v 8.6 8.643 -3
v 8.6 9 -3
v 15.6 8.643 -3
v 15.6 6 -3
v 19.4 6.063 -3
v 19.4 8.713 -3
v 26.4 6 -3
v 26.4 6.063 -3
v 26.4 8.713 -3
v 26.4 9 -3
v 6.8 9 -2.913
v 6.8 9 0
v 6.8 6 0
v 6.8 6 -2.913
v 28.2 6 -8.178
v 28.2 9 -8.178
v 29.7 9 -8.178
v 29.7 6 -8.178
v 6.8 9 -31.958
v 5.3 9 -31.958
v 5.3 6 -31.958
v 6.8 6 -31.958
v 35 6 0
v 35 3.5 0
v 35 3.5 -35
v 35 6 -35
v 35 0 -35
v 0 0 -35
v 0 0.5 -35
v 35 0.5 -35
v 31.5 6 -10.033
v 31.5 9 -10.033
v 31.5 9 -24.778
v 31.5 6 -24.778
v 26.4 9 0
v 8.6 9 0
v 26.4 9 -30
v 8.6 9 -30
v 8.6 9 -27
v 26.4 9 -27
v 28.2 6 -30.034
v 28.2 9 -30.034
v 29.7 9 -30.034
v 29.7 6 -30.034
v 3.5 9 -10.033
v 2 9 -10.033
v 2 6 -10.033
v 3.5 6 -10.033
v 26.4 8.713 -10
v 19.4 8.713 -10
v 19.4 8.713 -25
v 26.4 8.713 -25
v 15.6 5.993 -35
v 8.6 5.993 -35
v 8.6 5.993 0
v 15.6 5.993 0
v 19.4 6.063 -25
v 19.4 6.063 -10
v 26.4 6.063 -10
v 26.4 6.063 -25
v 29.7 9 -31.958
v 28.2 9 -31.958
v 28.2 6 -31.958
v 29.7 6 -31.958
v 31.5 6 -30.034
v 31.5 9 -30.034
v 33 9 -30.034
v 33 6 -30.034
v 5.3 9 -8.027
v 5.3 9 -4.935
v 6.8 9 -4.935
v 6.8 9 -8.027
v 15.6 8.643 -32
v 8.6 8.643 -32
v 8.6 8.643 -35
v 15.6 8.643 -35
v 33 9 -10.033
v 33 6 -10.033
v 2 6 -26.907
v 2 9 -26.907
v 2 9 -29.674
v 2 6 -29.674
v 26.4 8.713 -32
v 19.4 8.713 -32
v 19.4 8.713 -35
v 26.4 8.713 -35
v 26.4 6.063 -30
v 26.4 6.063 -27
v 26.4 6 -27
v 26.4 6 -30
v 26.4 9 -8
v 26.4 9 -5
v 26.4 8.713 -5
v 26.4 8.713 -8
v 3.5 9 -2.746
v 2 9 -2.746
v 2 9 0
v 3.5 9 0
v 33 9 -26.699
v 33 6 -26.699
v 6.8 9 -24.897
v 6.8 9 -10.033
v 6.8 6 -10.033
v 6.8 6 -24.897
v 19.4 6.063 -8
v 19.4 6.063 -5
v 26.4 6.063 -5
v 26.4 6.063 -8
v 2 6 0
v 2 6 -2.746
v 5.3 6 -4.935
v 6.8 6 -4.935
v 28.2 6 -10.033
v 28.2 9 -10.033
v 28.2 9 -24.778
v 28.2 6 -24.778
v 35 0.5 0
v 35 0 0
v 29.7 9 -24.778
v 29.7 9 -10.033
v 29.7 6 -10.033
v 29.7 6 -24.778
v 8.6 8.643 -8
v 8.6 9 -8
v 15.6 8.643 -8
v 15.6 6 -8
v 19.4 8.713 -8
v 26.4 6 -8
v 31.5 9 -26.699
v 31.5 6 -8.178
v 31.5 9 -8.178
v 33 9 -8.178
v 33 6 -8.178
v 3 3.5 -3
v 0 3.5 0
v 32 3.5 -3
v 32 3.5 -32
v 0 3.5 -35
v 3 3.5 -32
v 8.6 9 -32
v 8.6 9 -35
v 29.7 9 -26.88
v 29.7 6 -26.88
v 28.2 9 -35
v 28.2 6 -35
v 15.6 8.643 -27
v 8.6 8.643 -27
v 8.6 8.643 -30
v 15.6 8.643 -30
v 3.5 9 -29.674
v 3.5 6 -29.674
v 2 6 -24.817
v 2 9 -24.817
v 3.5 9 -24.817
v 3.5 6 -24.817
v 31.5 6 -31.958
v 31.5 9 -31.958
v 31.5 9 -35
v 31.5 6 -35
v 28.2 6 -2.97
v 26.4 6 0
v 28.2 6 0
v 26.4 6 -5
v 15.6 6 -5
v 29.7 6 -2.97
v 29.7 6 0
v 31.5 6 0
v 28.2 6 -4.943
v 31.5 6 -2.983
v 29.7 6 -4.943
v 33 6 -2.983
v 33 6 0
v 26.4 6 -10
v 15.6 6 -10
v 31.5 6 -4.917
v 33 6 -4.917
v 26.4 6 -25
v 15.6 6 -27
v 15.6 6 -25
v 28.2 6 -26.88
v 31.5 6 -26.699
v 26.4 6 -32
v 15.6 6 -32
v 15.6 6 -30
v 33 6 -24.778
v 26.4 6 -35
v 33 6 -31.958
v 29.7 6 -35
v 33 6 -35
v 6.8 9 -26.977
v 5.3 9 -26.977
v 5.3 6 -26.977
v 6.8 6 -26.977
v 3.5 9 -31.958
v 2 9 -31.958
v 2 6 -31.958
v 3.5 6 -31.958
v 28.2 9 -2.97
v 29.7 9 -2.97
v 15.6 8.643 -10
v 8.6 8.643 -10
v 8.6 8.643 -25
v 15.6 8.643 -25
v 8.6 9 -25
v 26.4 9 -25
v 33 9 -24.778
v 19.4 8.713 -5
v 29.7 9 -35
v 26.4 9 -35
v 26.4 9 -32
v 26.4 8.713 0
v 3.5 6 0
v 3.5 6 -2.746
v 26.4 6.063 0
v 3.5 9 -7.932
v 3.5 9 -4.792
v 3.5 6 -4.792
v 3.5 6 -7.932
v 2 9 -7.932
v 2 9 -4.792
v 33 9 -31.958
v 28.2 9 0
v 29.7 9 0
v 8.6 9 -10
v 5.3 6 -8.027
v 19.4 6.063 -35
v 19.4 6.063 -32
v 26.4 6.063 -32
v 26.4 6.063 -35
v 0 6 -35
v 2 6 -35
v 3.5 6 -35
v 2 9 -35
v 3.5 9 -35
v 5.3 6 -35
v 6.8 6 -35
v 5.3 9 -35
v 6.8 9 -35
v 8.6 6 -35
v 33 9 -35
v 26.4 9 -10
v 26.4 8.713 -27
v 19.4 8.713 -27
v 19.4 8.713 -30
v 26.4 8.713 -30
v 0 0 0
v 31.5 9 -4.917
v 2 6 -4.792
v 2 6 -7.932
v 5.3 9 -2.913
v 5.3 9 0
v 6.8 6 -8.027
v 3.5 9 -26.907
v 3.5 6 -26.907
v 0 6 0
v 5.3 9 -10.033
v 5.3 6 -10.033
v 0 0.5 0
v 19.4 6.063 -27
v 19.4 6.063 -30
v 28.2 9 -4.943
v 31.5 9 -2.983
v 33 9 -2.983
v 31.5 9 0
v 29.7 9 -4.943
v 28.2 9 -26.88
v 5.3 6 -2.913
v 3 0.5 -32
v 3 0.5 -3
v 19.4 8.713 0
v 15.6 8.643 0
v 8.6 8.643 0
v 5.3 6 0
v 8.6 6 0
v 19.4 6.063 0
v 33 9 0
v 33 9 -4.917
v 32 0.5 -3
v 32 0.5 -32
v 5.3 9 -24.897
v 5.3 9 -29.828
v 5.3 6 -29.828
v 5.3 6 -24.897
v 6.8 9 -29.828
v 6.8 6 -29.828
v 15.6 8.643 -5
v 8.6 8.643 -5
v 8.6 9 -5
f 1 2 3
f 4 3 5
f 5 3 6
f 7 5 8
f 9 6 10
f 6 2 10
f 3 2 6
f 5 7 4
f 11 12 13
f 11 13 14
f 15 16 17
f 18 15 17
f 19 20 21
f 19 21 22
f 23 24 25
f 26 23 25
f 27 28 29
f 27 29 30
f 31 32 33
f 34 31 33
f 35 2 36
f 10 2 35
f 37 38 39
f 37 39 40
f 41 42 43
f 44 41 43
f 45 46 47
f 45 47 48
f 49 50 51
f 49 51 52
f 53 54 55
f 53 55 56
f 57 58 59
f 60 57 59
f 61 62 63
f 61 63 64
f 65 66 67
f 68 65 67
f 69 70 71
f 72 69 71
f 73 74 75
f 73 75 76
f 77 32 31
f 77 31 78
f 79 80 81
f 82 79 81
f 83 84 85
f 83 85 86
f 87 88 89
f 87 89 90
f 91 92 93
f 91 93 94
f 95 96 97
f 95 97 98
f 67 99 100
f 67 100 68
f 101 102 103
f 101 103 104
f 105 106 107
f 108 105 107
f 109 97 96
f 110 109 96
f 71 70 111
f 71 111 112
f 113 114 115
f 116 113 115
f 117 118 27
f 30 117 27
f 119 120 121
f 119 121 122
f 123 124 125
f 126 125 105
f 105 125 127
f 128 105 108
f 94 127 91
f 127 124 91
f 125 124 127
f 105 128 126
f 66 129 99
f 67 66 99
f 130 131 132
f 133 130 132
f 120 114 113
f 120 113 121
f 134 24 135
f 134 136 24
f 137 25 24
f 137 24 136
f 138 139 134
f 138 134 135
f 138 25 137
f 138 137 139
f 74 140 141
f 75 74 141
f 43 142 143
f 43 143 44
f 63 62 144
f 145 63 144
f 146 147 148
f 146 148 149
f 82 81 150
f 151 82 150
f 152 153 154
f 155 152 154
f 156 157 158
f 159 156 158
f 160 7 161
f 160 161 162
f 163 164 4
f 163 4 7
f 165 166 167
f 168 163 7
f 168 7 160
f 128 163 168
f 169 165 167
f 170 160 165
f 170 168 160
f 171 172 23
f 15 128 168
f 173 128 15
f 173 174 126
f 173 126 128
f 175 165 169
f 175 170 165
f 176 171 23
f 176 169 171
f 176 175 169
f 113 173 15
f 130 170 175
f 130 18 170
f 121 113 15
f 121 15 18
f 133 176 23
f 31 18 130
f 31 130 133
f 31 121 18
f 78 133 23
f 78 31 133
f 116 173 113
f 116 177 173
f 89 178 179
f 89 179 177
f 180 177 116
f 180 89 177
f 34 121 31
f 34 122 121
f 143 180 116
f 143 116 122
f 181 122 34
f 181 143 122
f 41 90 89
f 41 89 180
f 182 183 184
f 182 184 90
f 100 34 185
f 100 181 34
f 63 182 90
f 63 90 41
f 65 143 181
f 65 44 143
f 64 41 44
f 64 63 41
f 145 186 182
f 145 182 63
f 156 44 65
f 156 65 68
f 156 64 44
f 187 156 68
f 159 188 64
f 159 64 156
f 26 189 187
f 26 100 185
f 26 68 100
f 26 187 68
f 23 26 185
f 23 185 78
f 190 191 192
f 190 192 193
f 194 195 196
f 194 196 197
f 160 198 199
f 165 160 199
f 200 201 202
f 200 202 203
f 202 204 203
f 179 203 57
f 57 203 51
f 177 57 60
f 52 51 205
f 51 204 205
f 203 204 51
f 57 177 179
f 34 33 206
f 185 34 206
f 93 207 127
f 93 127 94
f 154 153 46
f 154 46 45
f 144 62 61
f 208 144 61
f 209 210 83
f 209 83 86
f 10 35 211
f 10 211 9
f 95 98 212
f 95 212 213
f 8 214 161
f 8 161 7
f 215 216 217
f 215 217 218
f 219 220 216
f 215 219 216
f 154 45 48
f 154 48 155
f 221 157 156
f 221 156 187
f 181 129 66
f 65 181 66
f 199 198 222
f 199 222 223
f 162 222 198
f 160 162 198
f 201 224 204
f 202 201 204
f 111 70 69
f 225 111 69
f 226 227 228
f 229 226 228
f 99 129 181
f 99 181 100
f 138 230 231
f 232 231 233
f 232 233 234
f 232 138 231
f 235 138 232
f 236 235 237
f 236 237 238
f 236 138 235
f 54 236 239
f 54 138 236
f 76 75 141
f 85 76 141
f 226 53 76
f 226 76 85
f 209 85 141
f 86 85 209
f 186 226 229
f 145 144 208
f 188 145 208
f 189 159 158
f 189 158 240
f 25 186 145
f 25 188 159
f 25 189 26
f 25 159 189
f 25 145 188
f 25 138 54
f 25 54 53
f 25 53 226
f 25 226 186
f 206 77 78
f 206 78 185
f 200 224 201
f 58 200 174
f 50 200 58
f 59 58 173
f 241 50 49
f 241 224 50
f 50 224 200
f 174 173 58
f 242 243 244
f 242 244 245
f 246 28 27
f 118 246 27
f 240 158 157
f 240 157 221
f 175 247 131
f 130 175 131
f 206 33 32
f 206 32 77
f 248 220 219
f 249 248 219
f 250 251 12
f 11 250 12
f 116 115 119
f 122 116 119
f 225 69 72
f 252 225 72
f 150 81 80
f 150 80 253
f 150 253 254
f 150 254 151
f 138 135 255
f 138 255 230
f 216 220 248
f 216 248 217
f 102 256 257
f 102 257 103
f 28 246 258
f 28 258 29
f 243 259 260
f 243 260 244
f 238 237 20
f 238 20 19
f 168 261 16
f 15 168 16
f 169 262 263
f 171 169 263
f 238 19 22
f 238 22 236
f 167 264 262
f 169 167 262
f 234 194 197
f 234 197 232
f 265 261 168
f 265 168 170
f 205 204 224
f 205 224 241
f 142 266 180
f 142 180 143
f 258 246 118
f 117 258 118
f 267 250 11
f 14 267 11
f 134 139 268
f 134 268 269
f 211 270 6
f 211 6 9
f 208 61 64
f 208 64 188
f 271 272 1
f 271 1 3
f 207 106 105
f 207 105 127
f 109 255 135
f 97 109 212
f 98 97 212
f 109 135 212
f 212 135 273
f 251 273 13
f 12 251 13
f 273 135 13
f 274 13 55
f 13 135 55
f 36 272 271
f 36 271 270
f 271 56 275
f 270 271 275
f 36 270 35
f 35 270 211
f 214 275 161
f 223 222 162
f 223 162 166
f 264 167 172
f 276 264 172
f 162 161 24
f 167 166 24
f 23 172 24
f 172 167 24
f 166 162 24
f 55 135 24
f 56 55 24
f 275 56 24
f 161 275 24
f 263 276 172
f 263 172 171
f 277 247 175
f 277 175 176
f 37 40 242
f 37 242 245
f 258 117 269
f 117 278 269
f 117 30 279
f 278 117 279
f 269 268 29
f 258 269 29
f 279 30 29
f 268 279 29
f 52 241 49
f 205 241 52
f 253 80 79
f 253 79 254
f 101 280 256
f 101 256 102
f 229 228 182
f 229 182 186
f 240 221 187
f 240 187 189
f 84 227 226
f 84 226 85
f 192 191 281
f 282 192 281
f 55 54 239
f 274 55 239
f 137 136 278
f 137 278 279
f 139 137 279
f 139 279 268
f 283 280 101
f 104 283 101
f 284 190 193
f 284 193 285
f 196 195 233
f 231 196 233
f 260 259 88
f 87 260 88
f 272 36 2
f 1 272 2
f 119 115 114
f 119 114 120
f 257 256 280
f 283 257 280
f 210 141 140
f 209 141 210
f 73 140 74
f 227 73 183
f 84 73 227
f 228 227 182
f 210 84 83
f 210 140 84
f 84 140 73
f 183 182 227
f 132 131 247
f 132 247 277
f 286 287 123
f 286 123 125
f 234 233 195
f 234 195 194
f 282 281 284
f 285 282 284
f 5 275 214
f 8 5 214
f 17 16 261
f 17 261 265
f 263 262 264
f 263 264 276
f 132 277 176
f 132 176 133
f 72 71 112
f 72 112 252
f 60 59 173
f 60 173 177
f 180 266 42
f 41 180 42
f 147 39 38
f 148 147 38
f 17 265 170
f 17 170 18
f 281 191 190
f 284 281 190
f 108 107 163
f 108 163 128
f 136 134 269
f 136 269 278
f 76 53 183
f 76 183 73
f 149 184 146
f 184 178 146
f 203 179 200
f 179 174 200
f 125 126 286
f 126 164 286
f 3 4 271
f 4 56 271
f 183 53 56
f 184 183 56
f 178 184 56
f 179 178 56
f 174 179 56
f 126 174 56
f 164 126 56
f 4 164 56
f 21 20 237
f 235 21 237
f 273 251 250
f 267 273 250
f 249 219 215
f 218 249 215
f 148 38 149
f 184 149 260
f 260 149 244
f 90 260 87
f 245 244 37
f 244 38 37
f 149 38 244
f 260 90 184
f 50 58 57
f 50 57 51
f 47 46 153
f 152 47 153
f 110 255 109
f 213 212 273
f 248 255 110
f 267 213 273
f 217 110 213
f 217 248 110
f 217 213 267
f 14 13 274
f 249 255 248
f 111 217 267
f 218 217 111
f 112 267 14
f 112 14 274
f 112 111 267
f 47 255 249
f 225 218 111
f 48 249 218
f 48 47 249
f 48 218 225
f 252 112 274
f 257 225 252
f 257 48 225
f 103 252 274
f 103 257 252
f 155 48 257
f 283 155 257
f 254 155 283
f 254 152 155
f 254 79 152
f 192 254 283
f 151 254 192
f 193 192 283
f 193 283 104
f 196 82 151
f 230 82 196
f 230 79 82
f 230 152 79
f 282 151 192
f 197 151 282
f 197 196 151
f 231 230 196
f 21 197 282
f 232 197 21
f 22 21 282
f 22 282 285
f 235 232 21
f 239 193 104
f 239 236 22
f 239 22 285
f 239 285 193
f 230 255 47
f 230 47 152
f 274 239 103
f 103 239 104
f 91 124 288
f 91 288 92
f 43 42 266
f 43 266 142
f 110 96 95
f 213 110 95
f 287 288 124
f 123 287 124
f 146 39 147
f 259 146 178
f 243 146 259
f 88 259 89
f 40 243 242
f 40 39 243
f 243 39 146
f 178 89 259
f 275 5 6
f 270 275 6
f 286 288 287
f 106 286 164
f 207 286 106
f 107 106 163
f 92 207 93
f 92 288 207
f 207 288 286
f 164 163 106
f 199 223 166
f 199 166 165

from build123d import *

# Parameters (mm, degrees)
SKETCH1_W           = 35
SKETCH1_H           = 35
BOSS_EXTRUDE1_DEPTH = 9
SKETCH2_W           = 2
SKETCH2_H           = 35
SKETCH2_W_2         = 1.8
CUT_EXTRUDE1_DEPTH  = 3
SKETCH3_W           = 35
SKETCH3_H           = 3
CUT_EXTRUDE2_DEPTH  = 3
SKETCH4_W           = 7
SKETCH4_H           = 2.65
CUT_EXTRUDE3_DEPTH  = 51.309044912
SKETCH5_W           = 32
SKETCH5_H           = 3
CUT_EXTRUDE4_DEPTH  = 3
SKETCH6_W           = 17.8
SKETCH6_H           = 2
CUT_EXTRUDE5_DEPTH  = 3
SKETCH7_W           = 1.5
SKETCH7_H           = 2.079992284
SKETCH7_H_2         = 2.089639239
SKETCH7_H_3         = 2.130315237
SKETCH7_H_4         = 2.284421
SKETCH7_H_5         = 1.923722947
SKETCH7_H_6         = 2.10231694
SKETCH7_H_7         = 1.921766709
CUT_EXTRUDE6_DEPTH  = 3
SKETCH8_W           = 1.5
SKETCH8_H           = 1.855781426
SKETCH8_H_2         = 1.933933062
SKETCH8_H_3         = 1.973134408
SKETCH8_H_4         = 2.021952678
SKETCH8_H_5         = 2.006089453
SKETCH8_H_6         = 2.101240168
SKETCH8_H_7         = 2.045740356
CUT_EXTRUDE7_DEPTH  = 3
SKETCH9_W           = 32
SKETCH9_H           = 3
CUT_EXTRUDE9_DEPTH  = 3
SKETCH11_W          = 29
SKETCH11_H          = 3
CUT_EXTRUDE10_DEPTH = 3


with BuildPart() as part:
    # Sketch1 → Boss-Extrude1 (new body)
    with BuildSketch(Plane(origin=(0, 0, 0), x_dir=(1, 0, 0), z_dir=(0, 1, 0))):
        with Locations((17.5, 17.5)):
            Rectangle(SKETCH1_W, SKETCH1_H)
    extrude(amount=BOSS_EXTRUDE1_DEPTH)

    # Sketch2 → Cut-Extrude1 (cut)
    with BuildSketch(Plane(origin=(0, 9, 0), x_dir=(1, 0, 0), z_dir=(0, 1, 0))):
        with Locations((34, 17.5)):
            Rectangle(SKETCH2_W, SKETCH2_H)
        with Locations((30.6, 17.5)):
            Rectangle(SKETCH2_W_2, SKETCH2_H)
        with Locations((27.3, 17.5)):
            Rectangle(SKETCH2_W_2, SKETCH2_H)
        with Locations((1, 17.5)):
            Rectangle(SKETCH2_W, SKETCH2_H)
        with Locations((4.4, 17.5)):
            Rectangle(SKETCH2_W_2, SKETCH2_H)
        with Locations((7.7, 17.5)):
            Rectangle(SKETCH2_W_2, SKETCH2_H)
    extrude(amount=-CUT_EXTRUDE1_DEPTH, mode=Mode.SUBTRACT)

    # Sketch3 → Cut-Extrude2 (cut)
    with BuildSketch(Plane(origin=(35, 0, 0), x_dir=(0, 0, -1), z_dir=(1, 0, 0))):
        with Locations((17.5, 2)):
            Rectangle(SKETCH3_W, SKETCH3_H)
    extrude(amount=-CUT_EXTRUDE2_DEPTH, mode=Mode.SUBTRACT)

    # Sketch4 → Cut-Extrude3 (cut, through all)
    with BuildSketch(Plane.XY):
        with Locations((22.9, 7.387674937)):
            Rectangle(SKETCH4_W, SKETCH4_H)
        with Locations((12.1, 7.318212489)):
            Rectangle(SKETCH4_W, SKETCH4_H)
    extrude(amount=-CUT_EXTRUDE3_DEPTH, mode=Mode.SUBTRACT)

    # Sketch5 → Cut-Extrude4 (cut)
    with BuildSketch(Plane.XY):
        with Locations((16, 2)):
            Rectangle(SKETCH5_W, SKETCH5_H)
    extrude(amount=-CUT_EXTRUDE4_DEPTH, mode=Mode.SUBTRACT)

    # Sketch6 → Cut-Extrude5 (cut)
    with BuildSketch(Plane(origin=(0, 9, 0), x_dir=(1, 0, 0), z_dir=(0, 1, 0))):
        with Locations((17.5, 4)):
            Rectangle(SKETCH6_W, SKETCH6_H)
        with Locations((17.5, 9)):
            Rectangle(SKETCH6_W, SKETCH6_H)
        with Locations((17.5, 31)):
            Rectangle(SKETCH6_W, SKETCH6_H)
        with Locations((17.5, 26)):
            Rectangle(SKETCH6_W, SKETCH6_H)
    extrude(amount=-CUT_EXTRUDE5_DEPTH, mode=Mode.SUBTRACT)

    # Sketch7 → Cut-Extrude6 (cut)
    with BuildSketch(Plane(origin=(0, 9, 0), x_dir=(1, 0, 0), z_dir=(0, 1, 0))):
        with Locations((6.05, 25.936938184)):
            Rectangle(SKETCH7_W, SKETCH7_H)
        with Locations((2.75, 25.861771744)):
            Rectangle(SKETCH7_W, SKETCH7_H_2)
        with Locations((6.05, 30.892822657)):
            Rectangle(SKETCH7_W, SKETCH7_H_3)
        with Locations((2.75, 30.815769775)):
            Rectangle(SKETCH7_W, SKETCH7_H_4)
        with Locations((28.95, 30.996118802)):
            Rectangle(SKETCH7_W, SKETCH7_H_5)
        with Locations((32.25, 30.996118802)):
            Rectangle(SKETCH7_W, SKETCH7_H_5)
        with Locations((28.95, 25.828744005)):
            Rectangle(SKETCH7_W, SKETCH7_H_6)
        with Locations((32.25, 25.738468889)):
            Rectangle(SKETCH7_W, SKETCH7_H_7)
    extrude(amount=-CUT_EXTRUDE6_DEPTH, mode=Mode.SUBTRACT)

    # Sketch8 → Cut-Extrude7 (cut)
    with BuildSketch(Plane(origin=(0, 9, 0), x_dir=(1, 0, 0), z_dir=(0, 1, 0))):
        with Locations((28.95, 9.105526505)):
            Rectangle(SKETCH8_W, SKETCH8_H)
        with Locations((32.25, 9.105526505)):
            Rectangle(SKETCH8_W, SKETCH8_H)
        with Locations((32.25, 3.949699522)):
            Rectangle(SKETCH8_W, SKETCH8_H_2)
        with Locations((28.95, 3.95623308)):
            Rectangle(SKETCH8_W, SKETCH8_H_3)
        with Locations((6.05, 3.923953213)):
            Rectangle(SKETCH8_W, SKETCH8_H_4)
        with Locations((6.05, 9.030372491)):
            Rectangle(SKETCH8_W, SKETCH8_H_5)
        with Locations((2.75, 8.982797134)):
            Rectangle(SKETCH8_W, SKETCH8_H_6)
        with Locations((2.75, 3.769333302)):
            Rectangle(SKETCH8_W, SKETCH8_H_7)
    extrude(amount=-CUT_EXTRUDE7_DEPTH, mode=Mode.SUBTRACT)

    # Sketch9 → Cut-Extrude9 (cut)
    with BuildSketch(Plane(origin=(0, 0, -35), x_dir=(-1, 0, 0), z_dir=(0, 0, -1))):
        with Locations((-16, 2)):
            Rectangle(SKETCH9_W, SKETCH9_H)
    extrude(amount=-CUT_EXTRUDE9_DEPTH, mode=Mode.SUBTRACT)

    # Sketch11 → Cut-Extrude10 (cut)
    with BuildSketch(Plane.ZY):
        with Locations((-17.5, 2)):
            Rectangle(SKETCH11_W, SKETCH11_H)
    extrude(amount=-CUT_EXTRUDE10_DEPTH, mode=Mode.SUBTRACT)


solid = part.part
